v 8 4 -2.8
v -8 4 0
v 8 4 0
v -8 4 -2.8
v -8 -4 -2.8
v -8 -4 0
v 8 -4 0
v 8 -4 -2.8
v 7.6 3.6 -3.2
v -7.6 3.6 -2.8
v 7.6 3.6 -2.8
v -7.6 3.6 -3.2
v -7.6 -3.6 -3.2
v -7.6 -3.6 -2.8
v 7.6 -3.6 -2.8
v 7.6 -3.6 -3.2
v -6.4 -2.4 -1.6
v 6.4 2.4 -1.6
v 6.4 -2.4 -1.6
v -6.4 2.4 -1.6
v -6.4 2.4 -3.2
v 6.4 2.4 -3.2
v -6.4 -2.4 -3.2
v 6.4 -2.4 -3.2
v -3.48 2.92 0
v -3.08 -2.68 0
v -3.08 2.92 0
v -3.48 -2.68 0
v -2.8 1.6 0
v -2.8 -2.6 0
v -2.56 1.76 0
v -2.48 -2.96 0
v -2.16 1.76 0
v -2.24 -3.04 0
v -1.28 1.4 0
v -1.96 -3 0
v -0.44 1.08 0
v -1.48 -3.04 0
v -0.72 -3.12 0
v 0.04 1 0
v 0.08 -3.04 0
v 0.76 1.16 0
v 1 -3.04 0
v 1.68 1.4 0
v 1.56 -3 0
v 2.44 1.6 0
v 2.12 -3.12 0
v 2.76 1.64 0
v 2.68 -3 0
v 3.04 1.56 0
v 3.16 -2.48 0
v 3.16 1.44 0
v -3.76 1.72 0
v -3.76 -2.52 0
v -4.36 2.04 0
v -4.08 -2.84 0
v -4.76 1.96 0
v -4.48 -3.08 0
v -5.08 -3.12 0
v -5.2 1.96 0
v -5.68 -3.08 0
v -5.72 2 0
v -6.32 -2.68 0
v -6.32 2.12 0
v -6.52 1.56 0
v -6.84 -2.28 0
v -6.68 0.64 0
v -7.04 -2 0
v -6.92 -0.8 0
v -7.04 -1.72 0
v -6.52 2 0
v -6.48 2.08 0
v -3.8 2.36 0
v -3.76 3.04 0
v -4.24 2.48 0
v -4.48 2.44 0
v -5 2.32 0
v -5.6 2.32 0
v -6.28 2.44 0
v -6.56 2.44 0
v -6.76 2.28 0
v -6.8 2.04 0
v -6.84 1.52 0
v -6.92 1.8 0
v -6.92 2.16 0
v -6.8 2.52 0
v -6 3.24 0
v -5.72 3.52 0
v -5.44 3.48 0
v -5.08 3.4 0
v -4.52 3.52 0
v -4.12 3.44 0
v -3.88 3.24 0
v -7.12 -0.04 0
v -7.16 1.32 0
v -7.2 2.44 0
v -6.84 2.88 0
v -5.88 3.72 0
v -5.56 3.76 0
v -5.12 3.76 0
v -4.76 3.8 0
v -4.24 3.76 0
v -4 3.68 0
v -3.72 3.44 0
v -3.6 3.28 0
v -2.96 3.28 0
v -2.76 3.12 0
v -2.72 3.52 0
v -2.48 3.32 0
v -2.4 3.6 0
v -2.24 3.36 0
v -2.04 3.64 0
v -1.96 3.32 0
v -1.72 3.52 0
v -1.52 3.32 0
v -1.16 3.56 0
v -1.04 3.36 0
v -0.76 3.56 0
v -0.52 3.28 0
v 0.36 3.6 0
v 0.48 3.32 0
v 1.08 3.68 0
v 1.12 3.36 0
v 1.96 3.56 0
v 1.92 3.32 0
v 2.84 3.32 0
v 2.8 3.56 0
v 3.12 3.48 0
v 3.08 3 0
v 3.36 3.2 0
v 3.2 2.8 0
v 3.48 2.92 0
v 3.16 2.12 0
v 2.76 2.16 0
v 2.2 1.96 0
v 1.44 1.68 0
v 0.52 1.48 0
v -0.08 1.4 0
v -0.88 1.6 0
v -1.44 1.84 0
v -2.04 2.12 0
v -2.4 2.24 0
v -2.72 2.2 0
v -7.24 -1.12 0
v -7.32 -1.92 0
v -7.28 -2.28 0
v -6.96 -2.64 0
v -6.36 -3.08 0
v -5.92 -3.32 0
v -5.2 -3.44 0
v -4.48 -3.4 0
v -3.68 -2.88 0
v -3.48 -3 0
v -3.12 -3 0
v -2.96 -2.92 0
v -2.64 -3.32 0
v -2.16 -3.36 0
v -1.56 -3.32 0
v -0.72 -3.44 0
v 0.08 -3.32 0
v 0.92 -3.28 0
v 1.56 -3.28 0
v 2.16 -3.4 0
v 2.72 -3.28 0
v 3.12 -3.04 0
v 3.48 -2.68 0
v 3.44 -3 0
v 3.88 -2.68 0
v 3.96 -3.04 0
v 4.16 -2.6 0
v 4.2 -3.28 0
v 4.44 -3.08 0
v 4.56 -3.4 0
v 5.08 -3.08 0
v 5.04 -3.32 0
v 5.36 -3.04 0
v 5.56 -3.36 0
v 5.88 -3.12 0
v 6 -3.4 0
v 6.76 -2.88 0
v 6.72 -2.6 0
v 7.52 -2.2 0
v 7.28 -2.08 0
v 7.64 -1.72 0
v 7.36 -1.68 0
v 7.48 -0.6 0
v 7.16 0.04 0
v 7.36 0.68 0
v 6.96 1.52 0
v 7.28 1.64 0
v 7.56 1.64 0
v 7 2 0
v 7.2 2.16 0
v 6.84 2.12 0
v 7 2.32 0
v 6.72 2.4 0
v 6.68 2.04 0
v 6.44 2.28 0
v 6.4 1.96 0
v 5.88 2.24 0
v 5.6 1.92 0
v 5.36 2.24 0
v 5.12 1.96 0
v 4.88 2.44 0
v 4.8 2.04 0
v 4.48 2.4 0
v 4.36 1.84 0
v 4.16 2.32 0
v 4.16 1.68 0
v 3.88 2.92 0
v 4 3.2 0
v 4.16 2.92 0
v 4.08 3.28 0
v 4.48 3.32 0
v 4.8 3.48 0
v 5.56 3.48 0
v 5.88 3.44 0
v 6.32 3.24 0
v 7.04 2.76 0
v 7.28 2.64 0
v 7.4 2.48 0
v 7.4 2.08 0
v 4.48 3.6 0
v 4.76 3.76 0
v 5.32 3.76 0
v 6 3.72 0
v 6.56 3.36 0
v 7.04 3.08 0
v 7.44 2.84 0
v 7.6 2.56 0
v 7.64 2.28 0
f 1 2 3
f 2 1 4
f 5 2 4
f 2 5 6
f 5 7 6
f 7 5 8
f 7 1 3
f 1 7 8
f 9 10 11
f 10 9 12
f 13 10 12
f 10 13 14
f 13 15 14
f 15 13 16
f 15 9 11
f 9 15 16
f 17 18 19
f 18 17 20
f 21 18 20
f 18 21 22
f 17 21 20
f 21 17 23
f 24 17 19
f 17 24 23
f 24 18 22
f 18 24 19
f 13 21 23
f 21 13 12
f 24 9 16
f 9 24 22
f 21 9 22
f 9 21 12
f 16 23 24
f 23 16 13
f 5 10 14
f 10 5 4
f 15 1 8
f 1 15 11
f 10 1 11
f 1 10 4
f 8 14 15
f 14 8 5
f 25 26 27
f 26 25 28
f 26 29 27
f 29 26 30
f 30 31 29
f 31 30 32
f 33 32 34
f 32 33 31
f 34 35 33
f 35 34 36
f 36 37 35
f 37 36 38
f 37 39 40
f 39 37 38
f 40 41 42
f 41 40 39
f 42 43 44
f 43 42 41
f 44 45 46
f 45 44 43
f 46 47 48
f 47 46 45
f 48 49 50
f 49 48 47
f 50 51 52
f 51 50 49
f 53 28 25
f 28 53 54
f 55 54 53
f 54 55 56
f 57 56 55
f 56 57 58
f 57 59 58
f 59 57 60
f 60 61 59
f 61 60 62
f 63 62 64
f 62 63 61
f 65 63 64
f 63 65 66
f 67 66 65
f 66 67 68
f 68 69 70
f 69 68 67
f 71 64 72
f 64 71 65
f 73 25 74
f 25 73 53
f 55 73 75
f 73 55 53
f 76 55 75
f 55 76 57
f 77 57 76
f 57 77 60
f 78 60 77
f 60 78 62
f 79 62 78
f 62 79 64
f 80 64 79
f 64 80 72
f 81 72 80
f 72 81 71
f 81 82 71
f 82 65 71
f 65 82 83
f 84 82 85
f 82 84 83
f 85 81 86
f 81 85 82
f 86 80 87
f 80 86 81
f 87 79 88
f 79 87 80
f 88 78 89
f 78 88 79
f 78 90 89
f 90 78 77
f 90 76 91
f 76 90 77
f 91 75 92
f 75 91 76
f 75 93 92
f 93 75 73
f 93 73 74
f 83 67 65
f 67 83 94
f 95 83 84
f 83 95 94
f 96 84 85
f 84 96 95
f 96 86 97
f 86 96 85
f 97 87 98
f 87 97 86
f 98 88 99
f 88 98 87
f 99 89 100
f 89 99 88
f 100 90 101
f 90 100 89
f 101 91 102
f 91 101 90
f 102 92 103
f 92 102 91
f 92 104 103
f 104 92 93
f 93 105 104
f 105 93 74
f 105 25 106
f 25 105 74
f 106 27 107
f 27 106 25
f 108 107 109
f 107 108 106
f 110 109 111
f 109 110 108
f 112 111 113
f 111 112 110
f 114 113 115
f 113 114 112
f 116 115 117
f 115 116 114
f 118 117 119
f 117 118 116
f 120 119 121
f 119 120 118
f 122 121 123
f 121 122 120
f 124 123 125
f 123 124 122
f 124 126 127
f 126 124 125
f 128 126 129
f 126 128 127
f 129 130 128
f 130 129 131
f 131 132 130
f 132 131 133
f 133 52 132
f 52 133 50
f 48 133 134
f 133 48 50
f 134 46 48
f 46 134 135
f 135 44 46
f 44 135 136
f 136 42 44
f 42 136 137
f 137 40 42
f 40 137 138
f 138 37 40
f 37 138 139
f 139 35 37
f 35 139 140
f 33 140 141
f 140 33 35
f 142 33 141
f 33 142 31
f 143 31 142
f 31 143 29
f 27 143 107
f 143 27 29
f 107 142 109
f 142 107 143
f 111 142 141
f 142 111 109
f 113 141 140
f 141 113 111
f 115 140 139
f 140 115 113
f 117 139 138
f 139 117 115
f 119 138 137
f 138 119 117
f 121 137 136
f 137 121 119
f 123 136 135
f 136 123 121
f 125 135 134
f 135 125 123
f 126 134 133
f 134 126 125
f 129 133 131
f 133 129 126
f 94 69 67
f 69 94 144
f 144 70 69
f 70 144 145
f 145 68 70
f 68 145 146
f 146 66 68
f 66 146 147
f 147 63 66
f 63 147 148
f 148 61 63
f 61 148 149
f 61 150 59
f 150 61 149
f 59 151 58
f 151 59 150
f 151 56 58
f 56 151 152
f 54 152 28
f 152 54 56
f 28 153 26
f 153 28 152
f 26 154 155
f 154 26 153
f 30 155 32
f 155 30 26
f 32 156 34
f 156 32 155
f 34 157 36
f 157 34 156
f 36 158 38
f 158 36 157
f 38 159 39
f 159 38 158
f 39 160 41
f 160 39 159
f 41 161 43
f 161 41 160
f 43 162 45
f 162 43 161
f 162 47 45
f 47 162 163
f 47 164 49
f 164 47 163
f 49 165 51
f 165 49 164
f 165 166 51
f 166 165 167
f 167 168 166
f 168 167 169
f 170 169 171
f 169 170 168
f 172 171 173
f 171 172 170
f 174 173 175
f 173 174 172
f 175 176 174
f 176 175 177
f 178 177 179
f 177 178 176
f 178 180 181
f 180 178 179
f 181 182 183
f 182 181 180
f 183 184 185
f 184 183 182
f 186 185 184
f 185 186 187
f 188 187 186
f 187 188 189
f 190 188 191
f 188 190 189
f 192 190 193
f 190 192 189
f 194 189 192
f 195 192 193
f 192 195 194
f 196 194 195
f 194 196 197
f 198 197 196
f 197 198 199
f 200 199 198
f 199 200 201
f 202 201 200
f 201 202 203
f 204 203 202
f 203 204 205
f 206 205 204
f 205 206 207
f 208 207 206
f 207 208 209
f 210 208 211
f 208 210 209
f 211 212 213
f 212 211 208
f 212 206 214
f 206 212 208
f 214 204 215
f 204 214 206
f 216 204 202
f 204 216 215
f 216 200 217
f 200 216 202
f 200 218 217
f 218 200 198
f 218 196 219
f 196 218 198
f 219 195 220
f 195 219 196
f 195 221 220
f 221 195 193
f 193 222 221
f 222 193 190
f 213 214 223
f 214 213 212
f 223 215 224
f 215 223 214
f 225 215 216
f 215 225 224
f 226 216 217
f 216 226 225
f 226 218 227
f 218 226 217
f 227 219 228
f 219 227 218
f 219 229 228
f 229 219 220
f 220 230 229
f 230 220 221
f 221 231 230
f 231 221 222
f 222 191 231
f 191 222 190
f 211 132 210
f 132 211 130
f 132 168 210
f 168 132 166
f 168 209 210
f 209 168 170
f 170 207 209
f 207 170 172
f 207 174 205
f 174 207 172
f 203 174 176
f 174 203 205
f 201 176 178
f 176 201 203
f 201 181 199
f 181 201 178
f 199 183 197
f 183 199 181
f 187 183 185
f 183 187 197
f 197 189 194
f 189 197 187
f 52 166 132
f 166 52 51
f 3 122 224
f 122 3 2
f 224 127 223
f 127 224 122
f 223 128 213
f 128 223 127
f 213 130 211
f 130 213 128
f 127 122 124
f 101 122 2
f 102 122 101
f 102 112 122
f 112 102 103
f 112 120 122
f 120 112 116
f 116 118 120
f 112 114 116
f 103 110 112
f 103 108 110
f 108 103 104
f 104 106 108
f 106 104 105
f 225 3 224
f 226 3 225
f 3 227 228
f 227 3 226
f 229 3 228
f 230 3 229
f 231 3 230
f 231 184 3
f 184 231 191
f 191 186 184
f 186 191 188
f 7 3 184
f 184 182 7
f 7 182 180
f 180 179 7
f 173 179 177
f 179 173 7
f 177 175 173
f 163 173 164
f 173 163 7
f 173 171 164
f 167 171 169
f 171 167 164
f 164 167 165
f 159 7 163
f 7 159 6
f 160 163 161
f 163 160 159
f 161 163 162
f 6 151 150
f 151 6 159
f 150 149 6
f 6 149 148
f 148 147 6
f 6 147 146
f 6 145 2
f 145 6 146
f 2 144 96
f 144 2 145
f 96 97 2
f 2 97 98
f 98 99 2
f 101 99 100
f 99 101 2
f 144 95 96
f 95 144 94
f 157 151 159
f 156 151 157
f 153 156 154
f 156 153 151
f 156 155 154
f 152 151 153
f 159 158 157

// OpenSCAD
// file: ../p/box5.scad
use <../lib.scad>
function ldraw_lib__box5() = [
// 0 Box with 5 Faces and All Edges
// 0 Name: box5.dat
// 0 Author: James Jessiman
// 0 !LDRAW_ORG Primitive UPDATE 2012-01
// 0 !LICENSE Licensed under CC BY 4.0 : see CAreadme.txt
// 
// 0 BFC CERTIFY CCW
  [0,"BFC","CERTIFY"],
  [0,"BFC","CCW"],
// 
// 0 !HISTORY 2002-04-03 [sbliss] Modified for BFC compliance
// 0 !HISTORY 2002-04-25 [PTadmin] Official Update 2002-02
// 0 !HISTORY 2007-06-24 [PTadmin] Header formatted for Contributor Agreement
// 0 !HISTORY 2008-07-01 [PTadmin] Official Update 2008-01
// 0 !HISTORY 2012-02-16 [Philo] Changed to CCW
// 0 !HISTORY 2012-03-30 [PTadmin] Official Update 2012-01
// 
// 
// 2 24 1 1 1 -1 1 1
  [2,24,1,1,1,-1,1,1],
// 2 24 -1 1 1 -1 1 -1
  [2,24,-1,1,1,-1,1,-1],
// 2 24 -1 1 -1 1 1 -1
  [2,24,-1,1,-1,1,1,-1],
// 2 24 1 1 -1 1 1 1
  [2,24,1,1,-1,1,1,1],
// 2 24 1 0 1 -1 0 1
  [2,24,1,0,1,-1,0,1],
// 2 24 -1 0 1 -1 0 -1
  [2,24,-1,0,1,-1,0,-1],
// 2 24 -1 0 -1 1 0 -1
  [2,24,-1,0,-1,1,0,-1],
// 2 24 1 0 -1 1 0 1
  [2,24,1,0,-1,1,0,1],
// 2 24 1 0 1 1 1 1
  [2,24,1,0,1,1,1,1],
// 2 24 -1 0 1 -1 1 1
  [2,24,-1,0,1,-1,1,1],
// 2 24 1 0 -1 1 1 -1
  [2,24,1,0,-1,1,1,-1],
// 2 24 -1 0 -1 -1 1 -1
  [2,24,-1,0,-1,-1,1,-1],
// 4 16 -1 1 1 1 1 1 1 1 -1 -1 1 -1
  [4,16,-1,1,1,1,1,1,1,1,-1,-1,1,-1],
// 4 16 -1 1 1 -1 0 1 1 0 1 1 1 1
  [4,16,-1,1,1,-1,0,1,1,0,1,1,1,1],
// 4 16 -1 1 -1 -1 0 -1 -1 0 1 -1 1 1
  [4,16,-1,1,-1,-1,0,-1,-1,0,1,-1,1,1],
// 4 16 1 1 -1 1 0 -1 -1 0 -1 -1 1 -1
  [4,16,1,1,-1,1,0,-1,-1,0,-1,-1,1,-1],
// 4 16 1 1 1 1 0 1 1 0 -1 1 1 -1
  [4,16,1,1,1,1,0,1,1,0,-1,1,1,-1],
];
module ldraw_lib__box5(step=0, col=false, unit=2/5, alt=false, line=0.2, solid=!$preview)
    makepoly(ldraw_lib__box5(), step=step, col=col, unit=unit, alt=alt, line=line, solid=solid);
ldraw_lib__box5(line=0.2);
// file: ../p/box4.scad
use <../lib.scad>
function ldraw_lib__box4() = [
// 0 Box with 4 Faces (2 Parallel Pairs) and All Edges
// 0 Name: box4.dat
// 0 Author: James Jessiman
// 0 !LDRAW_ORG Primitive UPDATE 2012-01
// 0 !LICENSE Licensed under CC BY 4.0 : see CAreadme.txt
// 
// 0 BFC CERTIFY CCW
  [0,"BFC","CERTIFY"],
  [0,"BFC","CCW"],
// 
// 0 !HISTORY 2002-04-03 [sbliss] Modified for BFC compliance
// 0 !HISTORY 2002-04-25 [PTadmin] Official Update 2002-02
// 0 !HISTORY 2007-06-24 [PTadmin] Header formatted for Contributor Agreement
// 0 !HISTORY 2008-07-01 [PTadmin] Official Update 2008-01
// 0 !HISTORY 2012-02-16 [Philo] Changed to CCW
// 0 !HISTORY 2012-03-30 [PTadmin] Official Update 2012-01
// 
// 
// 2 24 1 1 1 -1 1 1
  [2,24,1,1,1,-1,1,1],
// 2 24 -1 1 1 -1 1 -1
  [2,24,-1,1,1,-1,1,-1],
// 2 24 -1 1 -1 1 1 -1
  [2,24,-1,1,-1,1,1,-1],
// 2 24 1 1 -1 1 1 1
  [2,24,1,1,-1,1,1,1],
// 2 24 1 0 1 -1 0 1
  [2,24,1,0,1,-1,0,1],
// 2 24 -1 0 1 -1 0 -1
  [2,24,-1,0,1,-1,0,-1],
// 2 24 -1 0 -1 1 0 -1
  [2,24,-1,0,-1,1,0,-1],
// 2 24 1 0 -1 1 0 1
  [2,24,1,0,-1,1,0,1],
// 2 24 1 0 1 1 1 1
  [2,24,1,0,1,1,1,1],
// 2 24 -1 0 1 -1 1 1
  [2,24,-1,0,1,-1,1,1],
// 2 24 1 0 -1 1 1 -1
  [2,24,1,0,-1,1,1,-1],
// 2 24 -1 0 -1 -1 1 -1
  [2,24,-1,0,-1,-1,1,-1],
// 4 16 -1 1 1 -1 0 1 1 0 1 1 1 1
  [4,16,-1,1,1,-1,0,1,1,0,1,1,1,1],
// 4 16 -1 1 -1 -1 0 -1 -1 0 1 -1 1 1
  [4,16,-1,1,-1,-1,0,-1,-1,0,1,-1,1,1],
// 4 16 1 1 -1 1 0 -1 -1 0 -1 -1 1 -1
  [4,16,1,1,-1,1,0,-1,-1,0,-1,-1,1,-1],
// 4 16 1 1 1 1 0 1 1 0 -1 1 1 -1
  [4,16,1,1,1,1,0,1,1,0,-1,1,1,-1],
];
module ldraw_lib__box4(step=0, col=false, unit=2/5, alt=false, line=0.2, solid=!$preview)
    makepoly(ldraw_lib__box4(), step=step, col=col, unit=unit, alt=alt, line=line, solid=solid);
ldraw_lib__box4(line=0.2);
// file: s/3069p0fs02.scad
use <../../lib.scad>
function ldraw_lib__s__3069p0fs02() = [
// 0 ~Tile  1 x  2 with Bedroll Pattern - Frame
// 0 Name: s\3069p0fs02.dat
// 0 Author: Alex Taylor [anathema]
// 0 !LDRAW_ORG Subpart UPDATE 2014-01
// 0 !LICENSE Licensed under CC BY 4.0 : see CAreadme.txt
// 
// 0 BFC CERTIFY CCW
  [0,"BFC","CERTIFY"],
  [0,"BFC","CCW"],
// 
// 0 !HISTORY 2014-01-18 [smr] moved bedroll frame from from 3069bp0f to s\3069p0fs02.dat
// 0 !HISTORY 2014-06-21 [PTadmin] Official Update 2014-01
// 
// 
// 4 16 11.9 0 9.4 20 0 10 -20 0 10 2.7 0 9.2
  [4,16,11.9,0,9.4,20,0,10,-20,0,10,2.7,0,9.2],
// 4 16 11.9 0 9.4 2.7 0 9.2 7 0 8.9 11.2 0 9
  [4,16,11.9,0,9.4,2.7,0,9.2,7,0,8.9,11.2,0,9],
// 4 16 11.2 0 9 7 0 8.9 7.8 0 8.7 10.2 0 8.2
  [4,16,11.2,0,9,7,0,8.9,7.8,0,8.7,10.2,0,8.2],
// 4 16 10.2 0 8.2 7.8 0 8.7 8.4 0 8 10 0 8
  [4,16,10.2,0,8.2,7.8,0,8.7,8.4,0,8,10,0,8],
// 3 16 7 0 8.9 2.7 0 9.2 4.9 0 8.9
  [3,16,7,0,8.9,2.7,0,9.2,4.9,0,8.9],
// 3 16 -11.9 0 9.5 2.7 0 9.2 -20 0 10
  [3,16,-11.9,0,9.5,2.7,0,9.2,-20,0,10],
// 3 16 -10.6 0 9.4 2.7 0 9.2 -11.9 0 9.5
  [3,16,-10.6,0,9.4,2.7,0,9.2,-11.9,0,9.5],
// 4 16 2.7 0 9.2 -10.6 0 9.4 -10 0 9.2 -5.1 0 9.1
  [4,16,2.7,0,9.2,-10.6,0,9.4,-10,0,9.2,-5.1,0,9.1],
// 4 16 2.7 0 9.2 -5.1 0 9.1 -2.9 0 8.9 0.9 0 9
  [4,16,2.7,0,9.2,-5.1,0,9.1,-2.9,0,8.9,0.9,0,9],
// 3 16 -2.9 0 8.9 -1.9 0 8.9 0.9 0 9
  [3,16,-2.9,0,8.9,-1.9,0,8.9,0.9,0,9],
// 3 16 -5.1 0 9.1 -4.3 0 8.8 -2.9 0 8.9
  [3,16,-5.1,0,9.1,-4.3,0,8.8,-2.9,0,8.9],
// 3 16 -10 0 9.2 -6 0 9 -5.1 0 9.1
  [3,16,-10,0,9.2,-6,0,9,-5.1,0,9.1],
// 4 16 -6.8 0 8.8 -6 0 9 -10 0 9.2 -9.3 0 8.6
  [4,16,-6.8,0,8.8,-6,0,9,-10,0,9.2,-9.3,0,8.6],
// 4 16 -7.4 0 8.2 -6.8 0 8.8 -9.3 0 8.6 -9 0 8.2
  [4,16,-7.4,0,8.2,-6.8,0,8.8,-9.3,0,8.6,-9,0,8.2],
// 3 16 13.3 0 9.4 20 0 10 11.9 0 9.4
  [3,16,13.3,0,9.4,20,0,10,11.9,0,9.4],
// 3 16 15 0 9.3 20 0 10 13.3 0 9.4
  [3,16,15,0,9.3,20,0,10,13.3,0,9.4],
// 4 16 20 0 10 15 0 9.3 16.4 0 8.4 17.6 0 7.7
  [4,16,20,0,10,15,0,9.3,16.4,0,8.4,17.6,0,7.7],
// 3 16 18.6 0 7.1 20 0 10 17.6 0 7.7
  [3,16,18.6,0,7.1,20,0,10,17.6,0,7.7],
// 3 16 19 0 6.4 20 0 10 18.6 0 7.1
  [3,16,19,0,6.4,20,0,10,18.6,0,7.1],
// 3 16 19.1 0 5.7 20 0 10 19 0 6.4
  [3,16,19.1,0,5.7,20,0,10,19,0,6.4],
// 4 16 19.1 0 -4.3 20 0 10 19.1 0 5.7 18.9 0 4.1
  [4,16,19.1,0,-4.3,20,0,10,19.1,0,5.7,18.9,0,4.1],
// 4 16 19.1 0 -4.3 18.9 0 4.1 18.4 0 1.7 18.7 0 -1.5
  [4,16,19.1,0,-4.3,18.9,0,4.1,18.4,0,1.7,18.7,0,-1.5],
// 3 16 20 0 -10 20 0 10 19.1 0 -4.3
  [3,16,20,0,-10,20,0,10,19.1,0,-4.3],
// 3 16 19.1 0 -4.3 18.8 0 -5.5 20 0 -10
  [3,16,19.1,0,-4.3,18.8,0,-5.5,20,0,-10],
// 3 16 20 0 -10 18.8 0 -5.5 16.9 0 -7.2
  [3,16,20,0,-10,18.8,0,-5.5,16.9,0,-7.2],
// 3 16 16.9 0 -7.2 15 0 -8.5 20 0 -10
  [3,16,16.9,0,-7.2,15,0,-8.5,20,0,-10],
// 4 16 11.4 0 -8.5 20 0 -10 15 0 -8.5 13.9 0 -8.4
  [4,16,11.4,0,-8.5,20,0,-10,15,0,-8.5,13.9,0,-8.4],
// 3 16 13.9 0 -8.4 12.6 0 -8.3 11.4 0 -8.5
  [3,16,13.9,0,-8.4,12.6,0,-8.3,11.4,0,-8.5],
// 4 16 5.4 0 -8.5 20 0 -10 11.4 0 -8.5 6.8 0 -8.2
  [4,16,5.4,0,-8.5,20,0,-10,11.4,0,-8.5,6.8,0,-8.2],
// 3 16 11.4 0 -8.5 10.5 0 -8.2 6.8 0 -8.2
  [3,16,11.4,0,-8.5,10.5,0,-8.2,6.8,0,-8.2],
// 4 16 6.8 0 -8.2 10.5 0 -8.2 9.9 0 -7.6 8.6 0 -7.5
  [4,16,6.8,0,-8.2,10.5,0,-8.2,9.9,0,-7.6,8.6,0,-7.5],
// 3 16 6.8 0 -8.2 8.6 0 -7.5 7.8 0 -7.6
  [3,16,6.8,0,-8.2,8.6,0,-7.5,7.8,0,-7.6],
// 4 16 -20 0 -10 20 0 -10 5.4 0 -8.5 -1.8 0 -8.6
  [4,16,-20,0,-10,20,0,-10,5.4,0,-8.5,-1.8,0,-8.6],
// 4 16 0.2 0 -8.3 -1.8 0 -8.6 5.4 0 -8.5 2.3 0 -8.2
  [4,16,0.2,0,-8.3,-1.8,0,-8.6,5.4,0,-8.5,2.3,0,-8.2],
// 3 16 2.3 0 -8.2 5.4 0 -8.5 3.9 0 -8.2
  [3,16,2.3,0,-8.2,5.4,0,-8.5,3.9,0,-8.2],
// 4 16 -20 0 -10 -1.8 0 -8.6 -11.2 0 -8.5 -13 0 -8.6
  [4,16,-20,0,-10,-1.8,0,-8.6,-11.2,0,-8.5,-13,0,-8.6],
// 3 16 -13 0 -8.6 -14.8 0 -8.3 -20 0 -10
  [3,16,-13,0,-8.6,-14.8,0,-8.3,-20,0,-10],
// 3 16 -20 0 -10 -14.8 0 -8.3 -15.9 0 -7.7
  [3,16,-20,0,-10,-14.8,0,-8.3,-15.9,0,-7.7],
// 3 16 -15.9 0 -7.7 -17.4 0 -6.6 -20 0 -10
  [3,16,-15.9,0,-7.7,-17.4,0,-6.6,-20,0,-10],
// 3 16 -20 0 -10 -17.4 0 -6.6 -18.2 0 -5.7
  [3,16,-20,0,-10,-17.4,0,-6.6,-18.2,0,-5.7],
// 4 16 -20 0 -10 -18.2 0 -5.7 -18.3 0 -4.8 -20 0 10
  [4,16,-20,0,-10,-18.2,0,-5.7,-18.3,0,-4.8,-20,0,10],
// 4 16 -18 0 6.1 -20 0 10 -18.3 0 -4.8 -18.1 0 -2.8
  [4,16,-18,0,6.1,-20,0,10,-18.3,0,-4.8,-18.1,0,-2.8],
// 3 16 -18 0 6.1 -17.1 0 7.2 -20 0 10
  [3,16,-18,0,6.1,-17.1,0,7.2,-20,0,10],
// 3 16 -20 0 10 -17.1 0 7.2 -14.7 0 9.3
  [3,16,-20,0,10,-17.1,0,7.2,-14.7,0,9.3],
// 3 16 -14.7 0 9.3 -13.9 0 9.4 -20 0 10
  [3,16,-14.7,0,9.3,-13.9,0,9.4,-20,0,10],
// 4 16 -20 0 10 -13.9 0 9.4 -12.8 0 9.4 -11.9 0 9.5
  [4,16,-20,0,10,-13.9,0,9.4,-12.8,0,9.4,-11.9,0,9.5],
// 4 16 -18.1 0 -2.8 -17.8 0 -0.1 -17.9 0 3.3 -18 0 6.1
  [4,16,-18.1,0,-2.8,-17.8,0,-0.1,-17.9,0,3.3,-18,0,6.1],
// 3 16 -5.4 0 -8.4 -11.2 0 -8.5 -1.8 0 -8.6
  [3,16,-5.4,0,-8.4,-11.2,0,-8.5,-1.8,0,-8.6],
// 3 16 -6.6 0 -8.3 -11.2 0 -8.5 -5.4 0 -8.4
  [3,16,-6.6,0,-8.3,-11.2,0,-8.5,-5.4,0,-8.4],
// 4 16 -11.2 0 -8.5 -6.6 0 -8.3 -7.8 0 -7.5 -8.7 0 -7.5
  [4,16,-11.2,0,-8.5,-6.6,0,-8.3,-7.8,0,-7.5,-8.7,0,-7.5],
// 3 16 -6.6 0 -8.3 -7.4 0 -7.3 -7.8 0 -7.5
  [3,16,-6.6,0,-8.3,-7.4,0,-7.3,-7.8,0,-7.5],
// 3 16 -9.2 0 -7.2 -11.2 0 -8.5 -8.7 0 -7.5
  [3,16,-9.2,0,-7.2,-11.2,0,-8.5,-8.7,0,-7.5],
// 3 16 -1.8 0 -8.6 -3.9 0 -8.3 -5.4 0 -8.4
  [3,16,-1.8,0,-8.6,-3.9,0,-8.3,-5.4,0,-8.4],
];
module ldraw_lib__s__3069p0fs02(step=0, col=false, unit=2/5, alt=false, line=0.2, solid=!$preview)
    makepoly(ldraw_lib__s__3069p0fs02(), step=step, col=col, unit=unit, alt=alt, line=line, solid=solid);
ldraw_lib__s__3069p0fs02(line=0.2);
// file: s/3069bs01.scad
use <../../lib.scad>
use <../../p/box4.scad>
use <../../p/box5.scad>
function ldraw_lib__s__3069bs01() = [
// 0 ~Tile  1 x  2 with Groove without Top Face
// 0 Name: s\3069bs01.dat
// 0 Author: Santeri Piippo [arezey]
// 0 !LDRAW_ORG Subpart UPDATE 2010-02
// 0 !LICENSE Licensed under CC BY 4.0 : see CAreadme.txt
// 
// 0 BFC CERTIFY CCW
  [0,"BFC","CERTIFY"],
  [0,"BFC","CCW"],
// 
// 0 !HISTORY 2010-07-05 [PTadmin] Official Update 2010-02
// 
// 
// 1 16 0 0 0 20 0 0 0 7 0 0 0 10 box4.dat
  [1,16,0,0,0,20,0,0,0,7,0,0,0,10, ldraw_lib__box4()],
// 1 16 0 7 0 19 0 0 0 1 0 0 0 9 box4.dat
  [1,16,0,7,0,19,0,0,0,1,0,0,0,9, ldraw_lib__box4()],
// 0 BFC INVERTNEXT
  [0,"BFC","INVERTNEXT"],
// 1 16 0 8 0 16 0 0 0 -4 0 0 0 6 box5.dat
  [1,16,0,8,0,16,0,0,0,-4,0,0,0,6, ldraw_lib__box5()],
// 4 16 -19 8 9 -16 8 6 -16 8 -6 -19 8 -9
  [4,16,-19,8,9,-16,8,6,-16,8,-6,-19,8,-9],
// 4 16 19 8 -9 16 8 -6 16 8 6 19 8 9
  [4,16,19,8,-9,16,8,-6,16,8,6,19,8,9],
// 4 16 19 8 9 16 8 6 -16 8 6 -19 8 9
  [4,16,19,8,9,16,8,6,-16,8,6,-19,8,9],
// 4 16 -19 8 -9 -16 8 -6 16 8 -6 19 8 -9
  [4,16,-19,8,-9,-16,8,-6,16,8,-6,19,8,-9],
// 4 16 -20 7 10 -19 7 9 -19 7 -9 -20 7 -10
  [4,16,-20,7,10,-19,7,9,-19,7,-9,-20,7,-10],
// 4 16 20 7 -10 19 7 -9 19 7 9 20 7 10
  [4,16,20,7,-10,19,7,-9,19,7,9,20,7,10],
// 4 16 20 7 10 19 7 9 -19 7 9 -20 7 10
  [4,16,20,7,10,19,7,9,-19,7,9,-20,7,10],
// 4 16 -20 7 -10 -19 7 -9 19 7 -9 20 7 -10
  [4,16,-20,7,-10,-19,7,-9,19,7,-9,20,7,-10],
// 0 //
];
module ldraw_lib__s__3069bs01(step=0, col=false, unit=2/5, alt=false, line=0.2, solid=!$preview)
    makepoly(ldraw_lib__s__3069bs01(), step=step, col=col, unit=unit, alt=alt, line=line, solid=solid);
ldraw_lib__s__3069bs01(line=0.2);
// main file
use <../lib.scad>
use <s/3069bs01.scad>
use <s/3069p0fs01.scad>
use <s/3069p0fs02.scad>
function ldraw_lib__3069bp0g() = [
// 0 Tile  1 x  2 with Dark Grey Bedroll Pattern
// 0 Name: 3069bp0g.dat
// 0 Author: Stephan Meisinger [smr]
// 0 !LDRAW_ORG Part UPDATE 2014-01
// 0 !LICENSE Licensed under CC BY 2.0 and CC BY 4.0 : see CAreadme.txt
// 
// 0 BFC CERTIFY CCW
  [0,"BFC","CERTIFY"],
  [0,"BFC","CCW"],
// 
// 0 !KEYWORDS BrickLink 3069pb0047, Rebrickable 3069bpr0033, Set 4728
// 
// 0 !HISTORY 2014-06-21 [PTadmin] Official Update 2014-01
// 
// 
// 1 16 0 0 0 1 0 0 0 1 0 0 0 1 s\3069bs01.dat
  [1,16,0,0,0,1,0,0,0,1,0,0,0,1, ldraw_lib__s__3069bs01()],
// 1 8 0 0 0 1 0 0 0 1 0 0 0 1 s\3069p0fs01.dat
  [1,8,0,0,0,1,0,0,0,1,0,0,0,1, ldraw_lib__s__3069p0fs01()],
// 1 16 0 0 0 1 0 0 0 1 0 0 0 1 s\3069p0fs02.dat
  [1,16,0,0,0,1,0,0,0,1,0,0,0,1, ldraw_lib__s__3069p0fs02()],
];
module ldraw_lib__3069bp0g(step=0, col=false, unit=2/5, alt=false, line=0.2, solid=!$preview)
    makepoly(ldraw_lib__3069bp0g(), step=step, col=col, unit=unit, alt=alt, line=line, solid=solid);
ldraw_lib__3069bp0g(line=0.2);
